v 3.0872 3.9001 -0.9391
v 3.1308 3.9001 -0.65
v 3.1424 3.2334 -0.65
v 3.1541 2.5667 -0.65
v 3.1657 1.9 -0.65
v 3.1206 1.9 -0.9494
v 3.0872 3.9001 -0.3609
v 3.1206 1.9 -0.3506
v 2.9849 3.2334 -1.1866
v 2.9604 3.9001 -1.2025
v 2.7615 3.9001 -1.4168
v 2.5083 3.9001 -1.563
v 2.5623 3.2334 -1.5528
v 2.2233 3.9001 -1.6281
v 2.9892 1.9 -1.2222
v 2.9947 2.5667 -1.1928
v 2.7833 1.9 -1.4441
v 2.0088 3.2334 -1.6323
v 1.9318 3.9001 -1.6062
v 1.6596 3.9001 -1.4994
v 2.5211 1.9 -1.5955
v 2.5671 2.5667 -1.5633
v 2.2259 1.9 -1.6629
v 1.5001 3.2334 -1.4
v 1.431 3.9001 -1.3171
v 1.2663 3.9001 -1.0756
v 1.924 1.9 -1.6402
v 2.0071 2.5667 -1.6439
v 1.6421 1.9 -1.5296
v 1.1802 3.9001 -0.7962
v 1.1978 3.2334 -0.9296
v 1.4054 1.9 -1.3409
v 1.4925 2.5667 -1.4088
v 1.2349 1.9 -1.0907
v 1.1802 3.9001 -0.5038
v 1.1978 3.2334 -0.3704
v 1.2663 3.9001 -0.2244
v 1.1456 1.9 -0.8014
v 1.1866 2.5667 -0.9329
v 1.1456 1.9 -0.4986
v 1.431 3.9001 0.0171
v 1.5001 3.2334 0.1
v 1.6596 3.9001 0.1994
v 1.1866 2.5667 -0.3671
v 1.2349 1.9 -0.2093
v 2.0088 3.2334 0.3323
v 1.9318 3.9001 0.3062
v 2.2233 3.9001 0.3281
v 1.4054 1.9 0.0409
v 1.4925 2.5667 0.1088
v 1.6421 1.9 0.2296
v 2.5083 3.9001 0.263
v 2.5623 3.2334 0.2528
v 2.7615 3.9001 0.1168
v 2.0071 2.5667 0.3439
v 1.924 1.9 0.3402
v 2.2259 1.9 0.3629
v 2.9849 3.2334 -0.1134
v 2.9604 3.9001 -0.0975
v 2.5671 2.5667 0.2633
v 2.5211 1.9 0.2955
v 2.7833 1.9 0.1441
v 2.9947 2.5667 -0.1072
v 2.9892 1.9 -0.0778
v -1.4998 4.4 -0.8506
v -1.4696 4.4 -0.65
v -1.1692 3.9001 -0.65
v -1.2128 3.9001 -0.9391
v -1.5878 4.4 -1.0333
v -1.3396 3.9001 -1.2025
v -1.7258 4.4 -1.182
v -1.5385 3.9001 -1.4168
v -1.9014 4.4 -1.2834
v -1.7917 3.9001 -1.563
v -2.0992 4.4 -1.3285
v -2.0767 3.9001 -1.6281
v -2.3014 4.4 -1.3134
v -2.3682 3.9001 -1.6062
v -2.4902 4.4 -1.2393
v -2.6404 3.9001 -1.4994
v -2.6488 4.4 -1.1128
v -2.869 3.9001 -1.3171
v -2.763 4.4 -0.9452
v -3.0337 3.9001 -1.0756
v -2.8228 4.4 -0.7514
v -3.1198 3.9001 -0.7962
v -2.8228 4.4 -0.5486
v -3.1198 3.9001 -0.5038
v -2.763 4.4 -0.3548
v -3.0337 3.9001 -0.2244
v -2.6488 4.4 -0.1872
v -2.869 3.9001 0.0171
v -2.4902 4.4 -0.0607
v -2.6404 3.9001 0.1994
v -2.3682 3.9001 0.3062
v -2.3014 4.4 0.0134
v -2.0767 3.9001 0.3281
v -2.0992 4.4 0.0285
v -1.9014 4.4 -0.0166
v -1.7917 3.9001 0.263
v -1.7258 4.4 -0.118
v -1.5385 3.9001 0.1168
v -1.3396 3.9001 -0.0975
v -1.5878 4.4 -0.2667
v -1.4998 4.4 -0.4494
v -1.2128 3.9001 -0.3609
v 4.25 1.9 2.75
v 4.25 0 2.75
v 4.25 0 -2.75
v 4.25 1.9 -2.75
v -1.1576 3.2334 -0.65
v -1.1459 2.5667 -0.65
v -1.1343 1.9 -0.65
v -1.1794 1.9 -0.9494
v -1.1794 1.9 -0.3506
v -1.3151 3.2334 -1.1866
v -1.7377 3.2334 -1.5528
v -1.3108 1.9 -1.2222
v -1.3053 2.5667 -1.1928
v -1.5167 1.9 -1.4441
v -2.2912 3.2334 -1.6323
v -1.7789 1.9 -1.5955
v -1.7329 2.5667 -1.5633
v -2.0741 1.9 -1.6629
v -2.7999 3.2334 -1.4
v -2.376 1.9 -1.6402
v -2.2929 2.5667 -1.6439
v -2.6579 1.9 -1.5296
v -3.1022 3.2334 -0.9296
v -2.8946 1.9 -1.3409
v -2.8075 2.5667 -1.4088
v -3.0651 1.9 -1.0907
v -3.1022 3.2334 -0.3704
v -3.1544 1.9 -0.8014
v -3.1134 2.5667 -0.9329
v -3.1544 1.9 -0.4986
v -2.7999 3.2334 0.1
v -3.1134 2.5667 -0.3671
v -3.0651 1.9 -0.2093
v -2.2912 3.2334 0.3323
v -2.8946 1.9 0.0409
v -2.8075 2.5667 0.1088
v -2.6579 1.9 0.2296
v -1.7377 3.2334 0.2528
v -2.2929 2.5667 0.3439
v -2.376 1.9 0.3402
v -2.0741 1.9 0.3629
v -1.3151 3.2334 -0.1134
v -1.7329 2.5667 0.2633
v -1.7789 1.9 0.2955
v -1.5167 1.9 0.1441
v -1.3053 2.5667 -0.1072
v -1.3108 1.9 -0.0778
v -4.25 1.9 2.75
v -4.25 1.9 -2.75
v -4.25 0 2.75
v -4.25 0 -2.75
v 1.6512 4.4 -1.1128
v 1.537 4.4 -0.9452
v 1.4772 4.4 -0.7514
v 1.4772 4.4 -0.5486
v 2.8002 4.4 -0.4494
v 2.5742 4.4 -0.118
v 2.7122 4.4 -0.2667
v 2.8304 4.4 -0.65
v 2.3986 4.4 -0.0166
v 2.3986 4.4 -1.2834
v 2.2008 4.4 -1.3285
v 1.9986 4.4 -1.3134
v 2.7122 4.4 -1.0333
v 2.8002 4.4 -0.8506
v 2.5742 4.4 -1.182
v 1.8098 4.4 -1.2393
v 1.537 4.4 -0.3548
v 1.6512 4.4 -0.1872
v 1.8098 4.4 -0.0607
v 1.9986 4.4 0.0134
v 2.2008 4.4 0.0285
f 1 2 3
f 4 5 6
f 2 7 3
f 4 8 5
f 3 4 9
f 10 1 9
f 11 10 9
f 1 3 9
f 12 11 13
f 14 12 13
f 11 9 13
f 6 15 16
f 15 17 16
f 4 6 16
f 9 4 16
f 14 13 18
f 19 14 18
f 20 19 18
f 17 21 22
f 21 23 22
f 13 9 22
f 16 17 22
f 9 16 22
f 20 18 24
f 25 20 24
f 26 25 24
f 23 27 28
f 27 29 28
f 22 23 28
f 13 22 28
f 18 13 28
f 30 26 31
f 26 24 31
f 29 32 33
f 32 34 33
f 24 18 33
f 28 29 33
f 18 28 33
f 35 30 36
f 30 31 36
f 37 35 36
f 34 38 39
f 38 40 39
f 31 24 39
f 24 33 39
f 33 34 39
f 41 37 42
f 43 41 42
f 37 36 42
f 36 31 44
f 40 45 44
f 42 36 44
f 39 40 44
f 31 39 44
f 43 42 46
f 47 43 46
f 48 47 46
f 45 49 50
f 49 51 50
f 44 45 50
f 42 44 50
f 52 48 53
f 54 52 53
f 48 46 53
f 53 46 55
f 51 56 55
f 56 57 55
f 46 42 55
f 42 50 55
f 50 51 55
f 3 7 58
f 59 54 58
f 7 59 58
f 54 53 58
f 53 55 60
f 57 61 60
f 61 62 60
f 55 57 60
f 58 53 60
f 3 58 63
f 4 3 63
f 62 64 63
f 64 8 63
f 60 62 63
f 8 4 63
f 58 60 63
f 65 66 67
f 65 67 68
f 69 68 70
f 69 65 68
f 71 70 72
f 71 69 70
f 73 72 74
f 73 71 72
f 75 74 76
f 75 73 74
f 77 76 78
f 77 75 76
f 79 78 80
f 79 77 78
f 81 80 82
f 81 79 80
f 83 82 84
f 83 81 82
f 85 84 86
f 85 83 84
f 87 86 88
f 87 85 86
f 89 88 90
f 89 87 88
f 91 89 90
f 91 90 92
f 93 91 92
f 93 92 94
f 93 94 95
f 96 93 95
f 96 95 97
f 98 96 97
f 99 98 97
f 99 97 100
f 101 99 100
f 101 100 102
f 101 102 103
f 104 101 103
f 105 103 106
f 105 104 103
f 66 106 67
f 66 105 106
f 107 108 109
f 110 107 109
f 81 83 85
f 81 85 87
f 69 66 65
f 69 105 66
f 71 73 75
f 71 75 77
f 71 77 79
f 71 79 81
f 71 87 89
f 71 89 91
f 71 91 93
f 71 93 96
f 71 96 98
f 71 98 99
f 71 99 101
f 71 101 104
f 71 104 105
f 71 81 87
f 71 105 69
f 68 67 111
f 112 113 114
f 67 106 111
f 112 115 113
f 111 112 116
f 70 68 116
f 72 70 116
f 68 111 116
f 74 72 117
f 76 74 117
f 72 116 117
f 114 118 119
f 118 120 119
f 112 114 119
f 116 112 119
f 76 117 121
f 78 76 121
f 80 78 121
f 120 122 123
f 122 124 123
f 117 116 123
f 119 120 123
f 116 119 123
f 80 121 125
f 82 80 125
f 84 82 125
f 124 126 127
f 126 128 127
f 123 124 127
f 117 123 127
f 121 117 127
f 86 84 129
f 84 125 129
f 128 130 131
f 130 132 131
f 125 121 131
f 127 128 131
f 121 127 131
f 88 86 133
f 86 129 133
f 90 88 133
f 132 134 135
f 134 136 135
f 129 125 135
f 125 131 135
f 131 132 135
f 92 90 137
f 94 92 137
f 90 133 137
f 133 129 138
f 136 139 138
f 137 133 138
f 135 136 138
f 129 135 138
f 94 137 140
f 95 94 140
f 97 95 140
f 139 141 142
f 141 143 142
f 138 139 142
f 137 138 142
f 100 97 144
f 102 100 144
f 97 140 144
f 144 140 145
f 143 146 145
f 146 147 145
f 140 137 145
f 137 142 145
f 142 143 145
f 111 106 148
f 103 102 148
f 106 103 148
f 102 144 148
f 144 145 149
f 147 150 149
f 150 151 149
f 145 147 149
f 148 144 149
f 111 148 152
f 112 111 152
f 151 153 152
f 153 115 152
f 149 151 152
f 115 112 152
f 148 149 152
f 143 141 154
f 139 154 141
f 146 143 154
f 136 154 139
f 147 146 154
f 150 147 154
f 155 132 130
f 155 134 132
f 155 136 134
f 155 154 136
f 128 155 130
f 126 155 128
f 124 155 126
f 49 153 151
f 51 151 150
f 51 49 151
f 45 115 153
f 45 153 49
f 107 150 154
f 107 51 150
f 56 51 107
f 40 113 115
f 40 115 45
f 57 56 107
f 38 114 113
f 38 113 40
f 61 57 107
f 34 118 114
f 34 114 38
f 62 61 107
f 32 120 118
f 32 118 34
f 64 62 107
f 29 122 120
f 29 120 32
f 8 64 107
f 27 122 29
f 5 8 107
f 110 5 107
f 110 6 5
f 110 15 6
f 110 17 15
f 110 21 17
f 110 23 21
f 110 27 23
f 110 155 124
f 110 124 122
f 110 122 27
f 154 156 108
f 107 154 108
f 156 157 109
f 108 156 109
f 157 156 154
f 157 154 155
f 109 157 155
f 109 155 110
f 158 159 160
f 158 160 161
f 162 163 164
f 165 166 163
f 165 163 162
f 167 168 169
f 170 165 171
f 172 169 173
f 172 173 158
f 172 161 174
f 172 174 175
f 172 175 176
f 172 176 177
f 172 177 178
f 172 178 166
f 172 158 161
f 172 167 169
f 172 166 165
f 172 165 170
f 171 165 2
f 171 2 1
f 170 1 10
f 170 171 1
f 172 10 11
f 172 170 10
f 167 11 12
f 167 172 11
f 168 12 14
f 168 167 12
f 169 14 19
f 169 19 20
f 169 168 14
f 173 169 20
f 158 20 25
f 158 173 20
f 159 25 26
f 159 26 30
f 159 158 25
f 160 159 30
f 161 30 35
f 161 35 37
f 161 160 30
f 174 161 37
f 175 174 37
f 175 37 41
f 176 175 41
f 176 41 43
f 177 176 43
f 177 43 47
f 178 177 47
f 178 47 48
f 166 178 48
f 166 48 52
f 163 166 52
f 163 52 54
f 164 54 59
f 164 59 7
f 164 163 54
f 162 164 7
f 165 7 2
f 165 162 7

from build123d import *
from OCP.BRepFilletAPI import BRepFilletAPI_MakeChamfer

# Parameters (mm, degrees)
SKETCH1_W                     = 8.5
SKETCH1_H                     = 5.5
BOSS_EXTRUDE1_DEPTH           = 1.9
BOSS_EXTRUDE2_REACH           = 8.307
BOSS_EXTRUDE2_START           = 0.9
SKETCH2_R                     = 1
BOSS_EXTRUDE2_DRAFT           = 1
BOSS_EXTRUDE3_START           = 0.9
SKETCH2_2_R                   = 1
BOSS_EXTRUDE3_DEPTH           = 1.6
BOSS_EXTRUDE3_DRAFT           = 1
BOSS_EXTRUDE3_PROFILE_2_DEPTH = 1.6
BOSS_EXTRUDE3_PROFILE_2_DRAFT = 1
CHAMFER1_SIZE                 = 0.5
CHAMFER1_SIZE2                = 0.291658349


with BuildPart() as part:
    # Sketch1 → Boss-Extrude1 (new body)
    with BuildSketch(Plane(origin=(0, 0, 0), x_dir=(1, 0, 0), z_dir=(0, 1, 0))):
        Rectangle(SKETCH1_W, SKETCH1_H)
    extrude(amount=BOSS_EXTRUDE1_DEPTH)




with BuildPart() as boss_extrude2_long_prism_1:
    # Sketch2 → Boss-Extrude2 (the long prism of profile 1, to be tilted and cut off)
    with BuildSketch(Plane(origin=(0, 1.9, 0), x_dir=(1, 0, 0), z_dir=(0, 1, 0)).offset(BOSS_EXTRUDE2_START)):
        with Locations((-2.15, 0.65)):
            Circle(SKETCH2_R)
    extrude(amount=-BOSS_EXTRUDE2_REACH)
    boss_extrude2_tool1_sides = [boss_extrude2_long_prism_1.faces().sort_by_distance(p)[0] for p in [
        (-3.15, -1.3535, -0.65),
    ]]
    draft(boss_extrude2_tool1_sides, Plane(origin=(0, 1.9, 0), x_dir=(1, 0, 0), z_dir=(0, 1, 0)).offset(BOSS_EXTRUDE2_START), BOSS_EXTRUDE2_DRAFT)  # the draft: side faces tilted about the start plane


with BuildPart() as part_1:
    add(part.part)
    boss_extrude2_tool1 = boss_extrude2_long_prism_1.part - part.part



with BuildPart() as boss_extrude2_long_prism_2:
    # Sketch2 → Boss-Extrude2 (the long prism of profile 2, to be tilted and cut off)
    with BuildSketch(Plane(origin=(0, 1.9, 0), x_dir=(1, 0, 0), z_dir=(0, 1, 0)).offset(BOSS_EXTRUDE2_START)):
        with Locations((2.15, 0.65)):
            Circle(SKETCH2_R)
    extrude(amount=-BOSS_EXTRUDE2_REACH)
    boss_extrude2_tool2_sides = [boss_extrude2_long_prism_2.faces().sort_by_distance(p)[0] for p in [
        (1.15, -1.3535, -0.65),
    ]]
    draft(boss_extrude2_tool2_sides, Plane(origin=(0, 1.9, 0), x_dir=(1, 0, 0), z_dir=(0, 1, 0)).offset(BOSS_EXTRUDE2_START), BOSS_EXTRUDE2_DRAFT)  # the draft: side faces tilted about the start plane


with BuildPart() as part_2:
    add(part_1.part)
    boss_extrude2_tool2 = boss_extrude2_long_prism_2.part - part.part
    add(boss_extrude2_tool1.solids().sort_by_distance((-2.15, 2.8, -0.65))[0])
    add(boss_extrude2_tool2.solids().sort_by_distance((2.15, 2.8, -0.65))[0])


with BuildPart() as boss_extrude3_tool:
    # Sketch2<2> → Boss-Extrude3 (with draft: the straight prism first)
    with BuildSketch(Plane(origin=(0, 1.9, 0), x_dir=(1, 0, 0), z_dir=(0, 1, 0)).offset(BOSS_EXTRUDE3_START)):
        with Locations((-2.15, 0.65)):
            Circle(SKETCH2_2_R)
    extrude(amount=BOSS_EXTRUDE3_DEPTH)
    # Boss-Extrude3: the draft: its side faces are tilted about the plane it starts from
    boss_extrude3_sides = [boss_extrude3_tool.faces().sort_by_distance(p)[0] for p in [
        (-3.15, 3.6, -0.65),
    ]]
    draft(boss_extrude3_sides, Plane(origin=(0, 1.9, 0), x_dir=(1, 0, 0), z_dir=(0, 1, 0)).offset(BOSS_EXTRUDE3_START), BOSS_EXTRUDE3_DRAFT)


with BuildPart() as part_3:
    add(part_2.part)

    # Boss-Extrude3: add boss_extrude3_tool
    add(boss_extrude3_tool.part)


with BuildPart() as boss_extrude3_profile_2_tool:
    # Sketch2<2> → Boss-Extrude3 profile 2 (with draft: the straight prism first)
    with BuildSketch(Plane(origin=(0, 1.9, 0), x_dir=(1, 0, 0), z_dir=(0, 1, 0)).offset(BOSS_EXTRUDE3_START)):
        with Locations((2.15, 0.65)):
            Circle(SKETCH2_2_R)
    extrude(amount=BOSS_EXTRUDE3_PROFILE_2_DEPTH)
    # Boss-Extrude3 profile 2: the draft: its side faces are tilted about the plane it starts from
    boss_extrude3_profile_2_sides = [boss_extrude3_profile_2_tool.faces().sort_by_distance(p)[0] for p in [
        (1.15, 3.6, -0.65),
    ]]
    draft(boss_extrude3_profile_2_sides, Plane(origin=(0, 1.9, 0), x_dir=(1, 0, 0), z_dir=(0, 1, 0)).offset(BOSS_EXTRUDE3_START), BOSS_EXTRUDE3_PROFILE_2_DRAFT)


with BuildPart() as part_4:
    add(part_3.part)

    # Boss-Extrude3 profile 2: add boss_extrude3_profile_2_tool
    add(boss_extrude3_profile_2_tool.part)

    # Chamfer1: one chamfer whose edges measure the first distance from different faces: ONE call of the kernel's chamfer builder (chamfer() names one face for all edges)
    chamfer1_edges_1 = [part_4.edges().sort_by_distance(p)[0] for p in [
        (-3.122071896, 4.4, -0.65),
    ]]
    chamfer1_side_1 = [part_4.faces().sort_by_distance(p)[0] for p in [
        (-3.143890727, 3.15, -0.65),
    ]]
    chamfer1_edges_2 = [part_4.edges().sort_by_distance(p)[0] for p in [
        (1.177928104, 4.4, -0.65),
    ]]
    chamfer1_side_2 = [part_4.faces().sort_by_distance(p)[0] for p in [
        (1.156109273, 3.15, -0.65),
    ]]
    chamfer1 = BRepFilletAPI_MakeChamfer(part_4.part.solid().wrapped)
    for e in chamfer1_edges_1:
        chamfer1.Add(CHAMFER1_SIZE, CHAMFER1_SIZE2, e.wrapped, chamfer1_side_1[0].wrapped)  # the first distance lies on this face
    for e in chamfer1_edges_2:
        chamfer1.Add(CHAMFER1_SIZE, CHAMFER1_SIZE2, e.wrapped, chamfer1_side_2[0].wrapped)  # the first distance lies on this face
    add(Compound.cast(chamfer1.Shape()), mode=Mode.REPLACE)


solid = part_4.part
